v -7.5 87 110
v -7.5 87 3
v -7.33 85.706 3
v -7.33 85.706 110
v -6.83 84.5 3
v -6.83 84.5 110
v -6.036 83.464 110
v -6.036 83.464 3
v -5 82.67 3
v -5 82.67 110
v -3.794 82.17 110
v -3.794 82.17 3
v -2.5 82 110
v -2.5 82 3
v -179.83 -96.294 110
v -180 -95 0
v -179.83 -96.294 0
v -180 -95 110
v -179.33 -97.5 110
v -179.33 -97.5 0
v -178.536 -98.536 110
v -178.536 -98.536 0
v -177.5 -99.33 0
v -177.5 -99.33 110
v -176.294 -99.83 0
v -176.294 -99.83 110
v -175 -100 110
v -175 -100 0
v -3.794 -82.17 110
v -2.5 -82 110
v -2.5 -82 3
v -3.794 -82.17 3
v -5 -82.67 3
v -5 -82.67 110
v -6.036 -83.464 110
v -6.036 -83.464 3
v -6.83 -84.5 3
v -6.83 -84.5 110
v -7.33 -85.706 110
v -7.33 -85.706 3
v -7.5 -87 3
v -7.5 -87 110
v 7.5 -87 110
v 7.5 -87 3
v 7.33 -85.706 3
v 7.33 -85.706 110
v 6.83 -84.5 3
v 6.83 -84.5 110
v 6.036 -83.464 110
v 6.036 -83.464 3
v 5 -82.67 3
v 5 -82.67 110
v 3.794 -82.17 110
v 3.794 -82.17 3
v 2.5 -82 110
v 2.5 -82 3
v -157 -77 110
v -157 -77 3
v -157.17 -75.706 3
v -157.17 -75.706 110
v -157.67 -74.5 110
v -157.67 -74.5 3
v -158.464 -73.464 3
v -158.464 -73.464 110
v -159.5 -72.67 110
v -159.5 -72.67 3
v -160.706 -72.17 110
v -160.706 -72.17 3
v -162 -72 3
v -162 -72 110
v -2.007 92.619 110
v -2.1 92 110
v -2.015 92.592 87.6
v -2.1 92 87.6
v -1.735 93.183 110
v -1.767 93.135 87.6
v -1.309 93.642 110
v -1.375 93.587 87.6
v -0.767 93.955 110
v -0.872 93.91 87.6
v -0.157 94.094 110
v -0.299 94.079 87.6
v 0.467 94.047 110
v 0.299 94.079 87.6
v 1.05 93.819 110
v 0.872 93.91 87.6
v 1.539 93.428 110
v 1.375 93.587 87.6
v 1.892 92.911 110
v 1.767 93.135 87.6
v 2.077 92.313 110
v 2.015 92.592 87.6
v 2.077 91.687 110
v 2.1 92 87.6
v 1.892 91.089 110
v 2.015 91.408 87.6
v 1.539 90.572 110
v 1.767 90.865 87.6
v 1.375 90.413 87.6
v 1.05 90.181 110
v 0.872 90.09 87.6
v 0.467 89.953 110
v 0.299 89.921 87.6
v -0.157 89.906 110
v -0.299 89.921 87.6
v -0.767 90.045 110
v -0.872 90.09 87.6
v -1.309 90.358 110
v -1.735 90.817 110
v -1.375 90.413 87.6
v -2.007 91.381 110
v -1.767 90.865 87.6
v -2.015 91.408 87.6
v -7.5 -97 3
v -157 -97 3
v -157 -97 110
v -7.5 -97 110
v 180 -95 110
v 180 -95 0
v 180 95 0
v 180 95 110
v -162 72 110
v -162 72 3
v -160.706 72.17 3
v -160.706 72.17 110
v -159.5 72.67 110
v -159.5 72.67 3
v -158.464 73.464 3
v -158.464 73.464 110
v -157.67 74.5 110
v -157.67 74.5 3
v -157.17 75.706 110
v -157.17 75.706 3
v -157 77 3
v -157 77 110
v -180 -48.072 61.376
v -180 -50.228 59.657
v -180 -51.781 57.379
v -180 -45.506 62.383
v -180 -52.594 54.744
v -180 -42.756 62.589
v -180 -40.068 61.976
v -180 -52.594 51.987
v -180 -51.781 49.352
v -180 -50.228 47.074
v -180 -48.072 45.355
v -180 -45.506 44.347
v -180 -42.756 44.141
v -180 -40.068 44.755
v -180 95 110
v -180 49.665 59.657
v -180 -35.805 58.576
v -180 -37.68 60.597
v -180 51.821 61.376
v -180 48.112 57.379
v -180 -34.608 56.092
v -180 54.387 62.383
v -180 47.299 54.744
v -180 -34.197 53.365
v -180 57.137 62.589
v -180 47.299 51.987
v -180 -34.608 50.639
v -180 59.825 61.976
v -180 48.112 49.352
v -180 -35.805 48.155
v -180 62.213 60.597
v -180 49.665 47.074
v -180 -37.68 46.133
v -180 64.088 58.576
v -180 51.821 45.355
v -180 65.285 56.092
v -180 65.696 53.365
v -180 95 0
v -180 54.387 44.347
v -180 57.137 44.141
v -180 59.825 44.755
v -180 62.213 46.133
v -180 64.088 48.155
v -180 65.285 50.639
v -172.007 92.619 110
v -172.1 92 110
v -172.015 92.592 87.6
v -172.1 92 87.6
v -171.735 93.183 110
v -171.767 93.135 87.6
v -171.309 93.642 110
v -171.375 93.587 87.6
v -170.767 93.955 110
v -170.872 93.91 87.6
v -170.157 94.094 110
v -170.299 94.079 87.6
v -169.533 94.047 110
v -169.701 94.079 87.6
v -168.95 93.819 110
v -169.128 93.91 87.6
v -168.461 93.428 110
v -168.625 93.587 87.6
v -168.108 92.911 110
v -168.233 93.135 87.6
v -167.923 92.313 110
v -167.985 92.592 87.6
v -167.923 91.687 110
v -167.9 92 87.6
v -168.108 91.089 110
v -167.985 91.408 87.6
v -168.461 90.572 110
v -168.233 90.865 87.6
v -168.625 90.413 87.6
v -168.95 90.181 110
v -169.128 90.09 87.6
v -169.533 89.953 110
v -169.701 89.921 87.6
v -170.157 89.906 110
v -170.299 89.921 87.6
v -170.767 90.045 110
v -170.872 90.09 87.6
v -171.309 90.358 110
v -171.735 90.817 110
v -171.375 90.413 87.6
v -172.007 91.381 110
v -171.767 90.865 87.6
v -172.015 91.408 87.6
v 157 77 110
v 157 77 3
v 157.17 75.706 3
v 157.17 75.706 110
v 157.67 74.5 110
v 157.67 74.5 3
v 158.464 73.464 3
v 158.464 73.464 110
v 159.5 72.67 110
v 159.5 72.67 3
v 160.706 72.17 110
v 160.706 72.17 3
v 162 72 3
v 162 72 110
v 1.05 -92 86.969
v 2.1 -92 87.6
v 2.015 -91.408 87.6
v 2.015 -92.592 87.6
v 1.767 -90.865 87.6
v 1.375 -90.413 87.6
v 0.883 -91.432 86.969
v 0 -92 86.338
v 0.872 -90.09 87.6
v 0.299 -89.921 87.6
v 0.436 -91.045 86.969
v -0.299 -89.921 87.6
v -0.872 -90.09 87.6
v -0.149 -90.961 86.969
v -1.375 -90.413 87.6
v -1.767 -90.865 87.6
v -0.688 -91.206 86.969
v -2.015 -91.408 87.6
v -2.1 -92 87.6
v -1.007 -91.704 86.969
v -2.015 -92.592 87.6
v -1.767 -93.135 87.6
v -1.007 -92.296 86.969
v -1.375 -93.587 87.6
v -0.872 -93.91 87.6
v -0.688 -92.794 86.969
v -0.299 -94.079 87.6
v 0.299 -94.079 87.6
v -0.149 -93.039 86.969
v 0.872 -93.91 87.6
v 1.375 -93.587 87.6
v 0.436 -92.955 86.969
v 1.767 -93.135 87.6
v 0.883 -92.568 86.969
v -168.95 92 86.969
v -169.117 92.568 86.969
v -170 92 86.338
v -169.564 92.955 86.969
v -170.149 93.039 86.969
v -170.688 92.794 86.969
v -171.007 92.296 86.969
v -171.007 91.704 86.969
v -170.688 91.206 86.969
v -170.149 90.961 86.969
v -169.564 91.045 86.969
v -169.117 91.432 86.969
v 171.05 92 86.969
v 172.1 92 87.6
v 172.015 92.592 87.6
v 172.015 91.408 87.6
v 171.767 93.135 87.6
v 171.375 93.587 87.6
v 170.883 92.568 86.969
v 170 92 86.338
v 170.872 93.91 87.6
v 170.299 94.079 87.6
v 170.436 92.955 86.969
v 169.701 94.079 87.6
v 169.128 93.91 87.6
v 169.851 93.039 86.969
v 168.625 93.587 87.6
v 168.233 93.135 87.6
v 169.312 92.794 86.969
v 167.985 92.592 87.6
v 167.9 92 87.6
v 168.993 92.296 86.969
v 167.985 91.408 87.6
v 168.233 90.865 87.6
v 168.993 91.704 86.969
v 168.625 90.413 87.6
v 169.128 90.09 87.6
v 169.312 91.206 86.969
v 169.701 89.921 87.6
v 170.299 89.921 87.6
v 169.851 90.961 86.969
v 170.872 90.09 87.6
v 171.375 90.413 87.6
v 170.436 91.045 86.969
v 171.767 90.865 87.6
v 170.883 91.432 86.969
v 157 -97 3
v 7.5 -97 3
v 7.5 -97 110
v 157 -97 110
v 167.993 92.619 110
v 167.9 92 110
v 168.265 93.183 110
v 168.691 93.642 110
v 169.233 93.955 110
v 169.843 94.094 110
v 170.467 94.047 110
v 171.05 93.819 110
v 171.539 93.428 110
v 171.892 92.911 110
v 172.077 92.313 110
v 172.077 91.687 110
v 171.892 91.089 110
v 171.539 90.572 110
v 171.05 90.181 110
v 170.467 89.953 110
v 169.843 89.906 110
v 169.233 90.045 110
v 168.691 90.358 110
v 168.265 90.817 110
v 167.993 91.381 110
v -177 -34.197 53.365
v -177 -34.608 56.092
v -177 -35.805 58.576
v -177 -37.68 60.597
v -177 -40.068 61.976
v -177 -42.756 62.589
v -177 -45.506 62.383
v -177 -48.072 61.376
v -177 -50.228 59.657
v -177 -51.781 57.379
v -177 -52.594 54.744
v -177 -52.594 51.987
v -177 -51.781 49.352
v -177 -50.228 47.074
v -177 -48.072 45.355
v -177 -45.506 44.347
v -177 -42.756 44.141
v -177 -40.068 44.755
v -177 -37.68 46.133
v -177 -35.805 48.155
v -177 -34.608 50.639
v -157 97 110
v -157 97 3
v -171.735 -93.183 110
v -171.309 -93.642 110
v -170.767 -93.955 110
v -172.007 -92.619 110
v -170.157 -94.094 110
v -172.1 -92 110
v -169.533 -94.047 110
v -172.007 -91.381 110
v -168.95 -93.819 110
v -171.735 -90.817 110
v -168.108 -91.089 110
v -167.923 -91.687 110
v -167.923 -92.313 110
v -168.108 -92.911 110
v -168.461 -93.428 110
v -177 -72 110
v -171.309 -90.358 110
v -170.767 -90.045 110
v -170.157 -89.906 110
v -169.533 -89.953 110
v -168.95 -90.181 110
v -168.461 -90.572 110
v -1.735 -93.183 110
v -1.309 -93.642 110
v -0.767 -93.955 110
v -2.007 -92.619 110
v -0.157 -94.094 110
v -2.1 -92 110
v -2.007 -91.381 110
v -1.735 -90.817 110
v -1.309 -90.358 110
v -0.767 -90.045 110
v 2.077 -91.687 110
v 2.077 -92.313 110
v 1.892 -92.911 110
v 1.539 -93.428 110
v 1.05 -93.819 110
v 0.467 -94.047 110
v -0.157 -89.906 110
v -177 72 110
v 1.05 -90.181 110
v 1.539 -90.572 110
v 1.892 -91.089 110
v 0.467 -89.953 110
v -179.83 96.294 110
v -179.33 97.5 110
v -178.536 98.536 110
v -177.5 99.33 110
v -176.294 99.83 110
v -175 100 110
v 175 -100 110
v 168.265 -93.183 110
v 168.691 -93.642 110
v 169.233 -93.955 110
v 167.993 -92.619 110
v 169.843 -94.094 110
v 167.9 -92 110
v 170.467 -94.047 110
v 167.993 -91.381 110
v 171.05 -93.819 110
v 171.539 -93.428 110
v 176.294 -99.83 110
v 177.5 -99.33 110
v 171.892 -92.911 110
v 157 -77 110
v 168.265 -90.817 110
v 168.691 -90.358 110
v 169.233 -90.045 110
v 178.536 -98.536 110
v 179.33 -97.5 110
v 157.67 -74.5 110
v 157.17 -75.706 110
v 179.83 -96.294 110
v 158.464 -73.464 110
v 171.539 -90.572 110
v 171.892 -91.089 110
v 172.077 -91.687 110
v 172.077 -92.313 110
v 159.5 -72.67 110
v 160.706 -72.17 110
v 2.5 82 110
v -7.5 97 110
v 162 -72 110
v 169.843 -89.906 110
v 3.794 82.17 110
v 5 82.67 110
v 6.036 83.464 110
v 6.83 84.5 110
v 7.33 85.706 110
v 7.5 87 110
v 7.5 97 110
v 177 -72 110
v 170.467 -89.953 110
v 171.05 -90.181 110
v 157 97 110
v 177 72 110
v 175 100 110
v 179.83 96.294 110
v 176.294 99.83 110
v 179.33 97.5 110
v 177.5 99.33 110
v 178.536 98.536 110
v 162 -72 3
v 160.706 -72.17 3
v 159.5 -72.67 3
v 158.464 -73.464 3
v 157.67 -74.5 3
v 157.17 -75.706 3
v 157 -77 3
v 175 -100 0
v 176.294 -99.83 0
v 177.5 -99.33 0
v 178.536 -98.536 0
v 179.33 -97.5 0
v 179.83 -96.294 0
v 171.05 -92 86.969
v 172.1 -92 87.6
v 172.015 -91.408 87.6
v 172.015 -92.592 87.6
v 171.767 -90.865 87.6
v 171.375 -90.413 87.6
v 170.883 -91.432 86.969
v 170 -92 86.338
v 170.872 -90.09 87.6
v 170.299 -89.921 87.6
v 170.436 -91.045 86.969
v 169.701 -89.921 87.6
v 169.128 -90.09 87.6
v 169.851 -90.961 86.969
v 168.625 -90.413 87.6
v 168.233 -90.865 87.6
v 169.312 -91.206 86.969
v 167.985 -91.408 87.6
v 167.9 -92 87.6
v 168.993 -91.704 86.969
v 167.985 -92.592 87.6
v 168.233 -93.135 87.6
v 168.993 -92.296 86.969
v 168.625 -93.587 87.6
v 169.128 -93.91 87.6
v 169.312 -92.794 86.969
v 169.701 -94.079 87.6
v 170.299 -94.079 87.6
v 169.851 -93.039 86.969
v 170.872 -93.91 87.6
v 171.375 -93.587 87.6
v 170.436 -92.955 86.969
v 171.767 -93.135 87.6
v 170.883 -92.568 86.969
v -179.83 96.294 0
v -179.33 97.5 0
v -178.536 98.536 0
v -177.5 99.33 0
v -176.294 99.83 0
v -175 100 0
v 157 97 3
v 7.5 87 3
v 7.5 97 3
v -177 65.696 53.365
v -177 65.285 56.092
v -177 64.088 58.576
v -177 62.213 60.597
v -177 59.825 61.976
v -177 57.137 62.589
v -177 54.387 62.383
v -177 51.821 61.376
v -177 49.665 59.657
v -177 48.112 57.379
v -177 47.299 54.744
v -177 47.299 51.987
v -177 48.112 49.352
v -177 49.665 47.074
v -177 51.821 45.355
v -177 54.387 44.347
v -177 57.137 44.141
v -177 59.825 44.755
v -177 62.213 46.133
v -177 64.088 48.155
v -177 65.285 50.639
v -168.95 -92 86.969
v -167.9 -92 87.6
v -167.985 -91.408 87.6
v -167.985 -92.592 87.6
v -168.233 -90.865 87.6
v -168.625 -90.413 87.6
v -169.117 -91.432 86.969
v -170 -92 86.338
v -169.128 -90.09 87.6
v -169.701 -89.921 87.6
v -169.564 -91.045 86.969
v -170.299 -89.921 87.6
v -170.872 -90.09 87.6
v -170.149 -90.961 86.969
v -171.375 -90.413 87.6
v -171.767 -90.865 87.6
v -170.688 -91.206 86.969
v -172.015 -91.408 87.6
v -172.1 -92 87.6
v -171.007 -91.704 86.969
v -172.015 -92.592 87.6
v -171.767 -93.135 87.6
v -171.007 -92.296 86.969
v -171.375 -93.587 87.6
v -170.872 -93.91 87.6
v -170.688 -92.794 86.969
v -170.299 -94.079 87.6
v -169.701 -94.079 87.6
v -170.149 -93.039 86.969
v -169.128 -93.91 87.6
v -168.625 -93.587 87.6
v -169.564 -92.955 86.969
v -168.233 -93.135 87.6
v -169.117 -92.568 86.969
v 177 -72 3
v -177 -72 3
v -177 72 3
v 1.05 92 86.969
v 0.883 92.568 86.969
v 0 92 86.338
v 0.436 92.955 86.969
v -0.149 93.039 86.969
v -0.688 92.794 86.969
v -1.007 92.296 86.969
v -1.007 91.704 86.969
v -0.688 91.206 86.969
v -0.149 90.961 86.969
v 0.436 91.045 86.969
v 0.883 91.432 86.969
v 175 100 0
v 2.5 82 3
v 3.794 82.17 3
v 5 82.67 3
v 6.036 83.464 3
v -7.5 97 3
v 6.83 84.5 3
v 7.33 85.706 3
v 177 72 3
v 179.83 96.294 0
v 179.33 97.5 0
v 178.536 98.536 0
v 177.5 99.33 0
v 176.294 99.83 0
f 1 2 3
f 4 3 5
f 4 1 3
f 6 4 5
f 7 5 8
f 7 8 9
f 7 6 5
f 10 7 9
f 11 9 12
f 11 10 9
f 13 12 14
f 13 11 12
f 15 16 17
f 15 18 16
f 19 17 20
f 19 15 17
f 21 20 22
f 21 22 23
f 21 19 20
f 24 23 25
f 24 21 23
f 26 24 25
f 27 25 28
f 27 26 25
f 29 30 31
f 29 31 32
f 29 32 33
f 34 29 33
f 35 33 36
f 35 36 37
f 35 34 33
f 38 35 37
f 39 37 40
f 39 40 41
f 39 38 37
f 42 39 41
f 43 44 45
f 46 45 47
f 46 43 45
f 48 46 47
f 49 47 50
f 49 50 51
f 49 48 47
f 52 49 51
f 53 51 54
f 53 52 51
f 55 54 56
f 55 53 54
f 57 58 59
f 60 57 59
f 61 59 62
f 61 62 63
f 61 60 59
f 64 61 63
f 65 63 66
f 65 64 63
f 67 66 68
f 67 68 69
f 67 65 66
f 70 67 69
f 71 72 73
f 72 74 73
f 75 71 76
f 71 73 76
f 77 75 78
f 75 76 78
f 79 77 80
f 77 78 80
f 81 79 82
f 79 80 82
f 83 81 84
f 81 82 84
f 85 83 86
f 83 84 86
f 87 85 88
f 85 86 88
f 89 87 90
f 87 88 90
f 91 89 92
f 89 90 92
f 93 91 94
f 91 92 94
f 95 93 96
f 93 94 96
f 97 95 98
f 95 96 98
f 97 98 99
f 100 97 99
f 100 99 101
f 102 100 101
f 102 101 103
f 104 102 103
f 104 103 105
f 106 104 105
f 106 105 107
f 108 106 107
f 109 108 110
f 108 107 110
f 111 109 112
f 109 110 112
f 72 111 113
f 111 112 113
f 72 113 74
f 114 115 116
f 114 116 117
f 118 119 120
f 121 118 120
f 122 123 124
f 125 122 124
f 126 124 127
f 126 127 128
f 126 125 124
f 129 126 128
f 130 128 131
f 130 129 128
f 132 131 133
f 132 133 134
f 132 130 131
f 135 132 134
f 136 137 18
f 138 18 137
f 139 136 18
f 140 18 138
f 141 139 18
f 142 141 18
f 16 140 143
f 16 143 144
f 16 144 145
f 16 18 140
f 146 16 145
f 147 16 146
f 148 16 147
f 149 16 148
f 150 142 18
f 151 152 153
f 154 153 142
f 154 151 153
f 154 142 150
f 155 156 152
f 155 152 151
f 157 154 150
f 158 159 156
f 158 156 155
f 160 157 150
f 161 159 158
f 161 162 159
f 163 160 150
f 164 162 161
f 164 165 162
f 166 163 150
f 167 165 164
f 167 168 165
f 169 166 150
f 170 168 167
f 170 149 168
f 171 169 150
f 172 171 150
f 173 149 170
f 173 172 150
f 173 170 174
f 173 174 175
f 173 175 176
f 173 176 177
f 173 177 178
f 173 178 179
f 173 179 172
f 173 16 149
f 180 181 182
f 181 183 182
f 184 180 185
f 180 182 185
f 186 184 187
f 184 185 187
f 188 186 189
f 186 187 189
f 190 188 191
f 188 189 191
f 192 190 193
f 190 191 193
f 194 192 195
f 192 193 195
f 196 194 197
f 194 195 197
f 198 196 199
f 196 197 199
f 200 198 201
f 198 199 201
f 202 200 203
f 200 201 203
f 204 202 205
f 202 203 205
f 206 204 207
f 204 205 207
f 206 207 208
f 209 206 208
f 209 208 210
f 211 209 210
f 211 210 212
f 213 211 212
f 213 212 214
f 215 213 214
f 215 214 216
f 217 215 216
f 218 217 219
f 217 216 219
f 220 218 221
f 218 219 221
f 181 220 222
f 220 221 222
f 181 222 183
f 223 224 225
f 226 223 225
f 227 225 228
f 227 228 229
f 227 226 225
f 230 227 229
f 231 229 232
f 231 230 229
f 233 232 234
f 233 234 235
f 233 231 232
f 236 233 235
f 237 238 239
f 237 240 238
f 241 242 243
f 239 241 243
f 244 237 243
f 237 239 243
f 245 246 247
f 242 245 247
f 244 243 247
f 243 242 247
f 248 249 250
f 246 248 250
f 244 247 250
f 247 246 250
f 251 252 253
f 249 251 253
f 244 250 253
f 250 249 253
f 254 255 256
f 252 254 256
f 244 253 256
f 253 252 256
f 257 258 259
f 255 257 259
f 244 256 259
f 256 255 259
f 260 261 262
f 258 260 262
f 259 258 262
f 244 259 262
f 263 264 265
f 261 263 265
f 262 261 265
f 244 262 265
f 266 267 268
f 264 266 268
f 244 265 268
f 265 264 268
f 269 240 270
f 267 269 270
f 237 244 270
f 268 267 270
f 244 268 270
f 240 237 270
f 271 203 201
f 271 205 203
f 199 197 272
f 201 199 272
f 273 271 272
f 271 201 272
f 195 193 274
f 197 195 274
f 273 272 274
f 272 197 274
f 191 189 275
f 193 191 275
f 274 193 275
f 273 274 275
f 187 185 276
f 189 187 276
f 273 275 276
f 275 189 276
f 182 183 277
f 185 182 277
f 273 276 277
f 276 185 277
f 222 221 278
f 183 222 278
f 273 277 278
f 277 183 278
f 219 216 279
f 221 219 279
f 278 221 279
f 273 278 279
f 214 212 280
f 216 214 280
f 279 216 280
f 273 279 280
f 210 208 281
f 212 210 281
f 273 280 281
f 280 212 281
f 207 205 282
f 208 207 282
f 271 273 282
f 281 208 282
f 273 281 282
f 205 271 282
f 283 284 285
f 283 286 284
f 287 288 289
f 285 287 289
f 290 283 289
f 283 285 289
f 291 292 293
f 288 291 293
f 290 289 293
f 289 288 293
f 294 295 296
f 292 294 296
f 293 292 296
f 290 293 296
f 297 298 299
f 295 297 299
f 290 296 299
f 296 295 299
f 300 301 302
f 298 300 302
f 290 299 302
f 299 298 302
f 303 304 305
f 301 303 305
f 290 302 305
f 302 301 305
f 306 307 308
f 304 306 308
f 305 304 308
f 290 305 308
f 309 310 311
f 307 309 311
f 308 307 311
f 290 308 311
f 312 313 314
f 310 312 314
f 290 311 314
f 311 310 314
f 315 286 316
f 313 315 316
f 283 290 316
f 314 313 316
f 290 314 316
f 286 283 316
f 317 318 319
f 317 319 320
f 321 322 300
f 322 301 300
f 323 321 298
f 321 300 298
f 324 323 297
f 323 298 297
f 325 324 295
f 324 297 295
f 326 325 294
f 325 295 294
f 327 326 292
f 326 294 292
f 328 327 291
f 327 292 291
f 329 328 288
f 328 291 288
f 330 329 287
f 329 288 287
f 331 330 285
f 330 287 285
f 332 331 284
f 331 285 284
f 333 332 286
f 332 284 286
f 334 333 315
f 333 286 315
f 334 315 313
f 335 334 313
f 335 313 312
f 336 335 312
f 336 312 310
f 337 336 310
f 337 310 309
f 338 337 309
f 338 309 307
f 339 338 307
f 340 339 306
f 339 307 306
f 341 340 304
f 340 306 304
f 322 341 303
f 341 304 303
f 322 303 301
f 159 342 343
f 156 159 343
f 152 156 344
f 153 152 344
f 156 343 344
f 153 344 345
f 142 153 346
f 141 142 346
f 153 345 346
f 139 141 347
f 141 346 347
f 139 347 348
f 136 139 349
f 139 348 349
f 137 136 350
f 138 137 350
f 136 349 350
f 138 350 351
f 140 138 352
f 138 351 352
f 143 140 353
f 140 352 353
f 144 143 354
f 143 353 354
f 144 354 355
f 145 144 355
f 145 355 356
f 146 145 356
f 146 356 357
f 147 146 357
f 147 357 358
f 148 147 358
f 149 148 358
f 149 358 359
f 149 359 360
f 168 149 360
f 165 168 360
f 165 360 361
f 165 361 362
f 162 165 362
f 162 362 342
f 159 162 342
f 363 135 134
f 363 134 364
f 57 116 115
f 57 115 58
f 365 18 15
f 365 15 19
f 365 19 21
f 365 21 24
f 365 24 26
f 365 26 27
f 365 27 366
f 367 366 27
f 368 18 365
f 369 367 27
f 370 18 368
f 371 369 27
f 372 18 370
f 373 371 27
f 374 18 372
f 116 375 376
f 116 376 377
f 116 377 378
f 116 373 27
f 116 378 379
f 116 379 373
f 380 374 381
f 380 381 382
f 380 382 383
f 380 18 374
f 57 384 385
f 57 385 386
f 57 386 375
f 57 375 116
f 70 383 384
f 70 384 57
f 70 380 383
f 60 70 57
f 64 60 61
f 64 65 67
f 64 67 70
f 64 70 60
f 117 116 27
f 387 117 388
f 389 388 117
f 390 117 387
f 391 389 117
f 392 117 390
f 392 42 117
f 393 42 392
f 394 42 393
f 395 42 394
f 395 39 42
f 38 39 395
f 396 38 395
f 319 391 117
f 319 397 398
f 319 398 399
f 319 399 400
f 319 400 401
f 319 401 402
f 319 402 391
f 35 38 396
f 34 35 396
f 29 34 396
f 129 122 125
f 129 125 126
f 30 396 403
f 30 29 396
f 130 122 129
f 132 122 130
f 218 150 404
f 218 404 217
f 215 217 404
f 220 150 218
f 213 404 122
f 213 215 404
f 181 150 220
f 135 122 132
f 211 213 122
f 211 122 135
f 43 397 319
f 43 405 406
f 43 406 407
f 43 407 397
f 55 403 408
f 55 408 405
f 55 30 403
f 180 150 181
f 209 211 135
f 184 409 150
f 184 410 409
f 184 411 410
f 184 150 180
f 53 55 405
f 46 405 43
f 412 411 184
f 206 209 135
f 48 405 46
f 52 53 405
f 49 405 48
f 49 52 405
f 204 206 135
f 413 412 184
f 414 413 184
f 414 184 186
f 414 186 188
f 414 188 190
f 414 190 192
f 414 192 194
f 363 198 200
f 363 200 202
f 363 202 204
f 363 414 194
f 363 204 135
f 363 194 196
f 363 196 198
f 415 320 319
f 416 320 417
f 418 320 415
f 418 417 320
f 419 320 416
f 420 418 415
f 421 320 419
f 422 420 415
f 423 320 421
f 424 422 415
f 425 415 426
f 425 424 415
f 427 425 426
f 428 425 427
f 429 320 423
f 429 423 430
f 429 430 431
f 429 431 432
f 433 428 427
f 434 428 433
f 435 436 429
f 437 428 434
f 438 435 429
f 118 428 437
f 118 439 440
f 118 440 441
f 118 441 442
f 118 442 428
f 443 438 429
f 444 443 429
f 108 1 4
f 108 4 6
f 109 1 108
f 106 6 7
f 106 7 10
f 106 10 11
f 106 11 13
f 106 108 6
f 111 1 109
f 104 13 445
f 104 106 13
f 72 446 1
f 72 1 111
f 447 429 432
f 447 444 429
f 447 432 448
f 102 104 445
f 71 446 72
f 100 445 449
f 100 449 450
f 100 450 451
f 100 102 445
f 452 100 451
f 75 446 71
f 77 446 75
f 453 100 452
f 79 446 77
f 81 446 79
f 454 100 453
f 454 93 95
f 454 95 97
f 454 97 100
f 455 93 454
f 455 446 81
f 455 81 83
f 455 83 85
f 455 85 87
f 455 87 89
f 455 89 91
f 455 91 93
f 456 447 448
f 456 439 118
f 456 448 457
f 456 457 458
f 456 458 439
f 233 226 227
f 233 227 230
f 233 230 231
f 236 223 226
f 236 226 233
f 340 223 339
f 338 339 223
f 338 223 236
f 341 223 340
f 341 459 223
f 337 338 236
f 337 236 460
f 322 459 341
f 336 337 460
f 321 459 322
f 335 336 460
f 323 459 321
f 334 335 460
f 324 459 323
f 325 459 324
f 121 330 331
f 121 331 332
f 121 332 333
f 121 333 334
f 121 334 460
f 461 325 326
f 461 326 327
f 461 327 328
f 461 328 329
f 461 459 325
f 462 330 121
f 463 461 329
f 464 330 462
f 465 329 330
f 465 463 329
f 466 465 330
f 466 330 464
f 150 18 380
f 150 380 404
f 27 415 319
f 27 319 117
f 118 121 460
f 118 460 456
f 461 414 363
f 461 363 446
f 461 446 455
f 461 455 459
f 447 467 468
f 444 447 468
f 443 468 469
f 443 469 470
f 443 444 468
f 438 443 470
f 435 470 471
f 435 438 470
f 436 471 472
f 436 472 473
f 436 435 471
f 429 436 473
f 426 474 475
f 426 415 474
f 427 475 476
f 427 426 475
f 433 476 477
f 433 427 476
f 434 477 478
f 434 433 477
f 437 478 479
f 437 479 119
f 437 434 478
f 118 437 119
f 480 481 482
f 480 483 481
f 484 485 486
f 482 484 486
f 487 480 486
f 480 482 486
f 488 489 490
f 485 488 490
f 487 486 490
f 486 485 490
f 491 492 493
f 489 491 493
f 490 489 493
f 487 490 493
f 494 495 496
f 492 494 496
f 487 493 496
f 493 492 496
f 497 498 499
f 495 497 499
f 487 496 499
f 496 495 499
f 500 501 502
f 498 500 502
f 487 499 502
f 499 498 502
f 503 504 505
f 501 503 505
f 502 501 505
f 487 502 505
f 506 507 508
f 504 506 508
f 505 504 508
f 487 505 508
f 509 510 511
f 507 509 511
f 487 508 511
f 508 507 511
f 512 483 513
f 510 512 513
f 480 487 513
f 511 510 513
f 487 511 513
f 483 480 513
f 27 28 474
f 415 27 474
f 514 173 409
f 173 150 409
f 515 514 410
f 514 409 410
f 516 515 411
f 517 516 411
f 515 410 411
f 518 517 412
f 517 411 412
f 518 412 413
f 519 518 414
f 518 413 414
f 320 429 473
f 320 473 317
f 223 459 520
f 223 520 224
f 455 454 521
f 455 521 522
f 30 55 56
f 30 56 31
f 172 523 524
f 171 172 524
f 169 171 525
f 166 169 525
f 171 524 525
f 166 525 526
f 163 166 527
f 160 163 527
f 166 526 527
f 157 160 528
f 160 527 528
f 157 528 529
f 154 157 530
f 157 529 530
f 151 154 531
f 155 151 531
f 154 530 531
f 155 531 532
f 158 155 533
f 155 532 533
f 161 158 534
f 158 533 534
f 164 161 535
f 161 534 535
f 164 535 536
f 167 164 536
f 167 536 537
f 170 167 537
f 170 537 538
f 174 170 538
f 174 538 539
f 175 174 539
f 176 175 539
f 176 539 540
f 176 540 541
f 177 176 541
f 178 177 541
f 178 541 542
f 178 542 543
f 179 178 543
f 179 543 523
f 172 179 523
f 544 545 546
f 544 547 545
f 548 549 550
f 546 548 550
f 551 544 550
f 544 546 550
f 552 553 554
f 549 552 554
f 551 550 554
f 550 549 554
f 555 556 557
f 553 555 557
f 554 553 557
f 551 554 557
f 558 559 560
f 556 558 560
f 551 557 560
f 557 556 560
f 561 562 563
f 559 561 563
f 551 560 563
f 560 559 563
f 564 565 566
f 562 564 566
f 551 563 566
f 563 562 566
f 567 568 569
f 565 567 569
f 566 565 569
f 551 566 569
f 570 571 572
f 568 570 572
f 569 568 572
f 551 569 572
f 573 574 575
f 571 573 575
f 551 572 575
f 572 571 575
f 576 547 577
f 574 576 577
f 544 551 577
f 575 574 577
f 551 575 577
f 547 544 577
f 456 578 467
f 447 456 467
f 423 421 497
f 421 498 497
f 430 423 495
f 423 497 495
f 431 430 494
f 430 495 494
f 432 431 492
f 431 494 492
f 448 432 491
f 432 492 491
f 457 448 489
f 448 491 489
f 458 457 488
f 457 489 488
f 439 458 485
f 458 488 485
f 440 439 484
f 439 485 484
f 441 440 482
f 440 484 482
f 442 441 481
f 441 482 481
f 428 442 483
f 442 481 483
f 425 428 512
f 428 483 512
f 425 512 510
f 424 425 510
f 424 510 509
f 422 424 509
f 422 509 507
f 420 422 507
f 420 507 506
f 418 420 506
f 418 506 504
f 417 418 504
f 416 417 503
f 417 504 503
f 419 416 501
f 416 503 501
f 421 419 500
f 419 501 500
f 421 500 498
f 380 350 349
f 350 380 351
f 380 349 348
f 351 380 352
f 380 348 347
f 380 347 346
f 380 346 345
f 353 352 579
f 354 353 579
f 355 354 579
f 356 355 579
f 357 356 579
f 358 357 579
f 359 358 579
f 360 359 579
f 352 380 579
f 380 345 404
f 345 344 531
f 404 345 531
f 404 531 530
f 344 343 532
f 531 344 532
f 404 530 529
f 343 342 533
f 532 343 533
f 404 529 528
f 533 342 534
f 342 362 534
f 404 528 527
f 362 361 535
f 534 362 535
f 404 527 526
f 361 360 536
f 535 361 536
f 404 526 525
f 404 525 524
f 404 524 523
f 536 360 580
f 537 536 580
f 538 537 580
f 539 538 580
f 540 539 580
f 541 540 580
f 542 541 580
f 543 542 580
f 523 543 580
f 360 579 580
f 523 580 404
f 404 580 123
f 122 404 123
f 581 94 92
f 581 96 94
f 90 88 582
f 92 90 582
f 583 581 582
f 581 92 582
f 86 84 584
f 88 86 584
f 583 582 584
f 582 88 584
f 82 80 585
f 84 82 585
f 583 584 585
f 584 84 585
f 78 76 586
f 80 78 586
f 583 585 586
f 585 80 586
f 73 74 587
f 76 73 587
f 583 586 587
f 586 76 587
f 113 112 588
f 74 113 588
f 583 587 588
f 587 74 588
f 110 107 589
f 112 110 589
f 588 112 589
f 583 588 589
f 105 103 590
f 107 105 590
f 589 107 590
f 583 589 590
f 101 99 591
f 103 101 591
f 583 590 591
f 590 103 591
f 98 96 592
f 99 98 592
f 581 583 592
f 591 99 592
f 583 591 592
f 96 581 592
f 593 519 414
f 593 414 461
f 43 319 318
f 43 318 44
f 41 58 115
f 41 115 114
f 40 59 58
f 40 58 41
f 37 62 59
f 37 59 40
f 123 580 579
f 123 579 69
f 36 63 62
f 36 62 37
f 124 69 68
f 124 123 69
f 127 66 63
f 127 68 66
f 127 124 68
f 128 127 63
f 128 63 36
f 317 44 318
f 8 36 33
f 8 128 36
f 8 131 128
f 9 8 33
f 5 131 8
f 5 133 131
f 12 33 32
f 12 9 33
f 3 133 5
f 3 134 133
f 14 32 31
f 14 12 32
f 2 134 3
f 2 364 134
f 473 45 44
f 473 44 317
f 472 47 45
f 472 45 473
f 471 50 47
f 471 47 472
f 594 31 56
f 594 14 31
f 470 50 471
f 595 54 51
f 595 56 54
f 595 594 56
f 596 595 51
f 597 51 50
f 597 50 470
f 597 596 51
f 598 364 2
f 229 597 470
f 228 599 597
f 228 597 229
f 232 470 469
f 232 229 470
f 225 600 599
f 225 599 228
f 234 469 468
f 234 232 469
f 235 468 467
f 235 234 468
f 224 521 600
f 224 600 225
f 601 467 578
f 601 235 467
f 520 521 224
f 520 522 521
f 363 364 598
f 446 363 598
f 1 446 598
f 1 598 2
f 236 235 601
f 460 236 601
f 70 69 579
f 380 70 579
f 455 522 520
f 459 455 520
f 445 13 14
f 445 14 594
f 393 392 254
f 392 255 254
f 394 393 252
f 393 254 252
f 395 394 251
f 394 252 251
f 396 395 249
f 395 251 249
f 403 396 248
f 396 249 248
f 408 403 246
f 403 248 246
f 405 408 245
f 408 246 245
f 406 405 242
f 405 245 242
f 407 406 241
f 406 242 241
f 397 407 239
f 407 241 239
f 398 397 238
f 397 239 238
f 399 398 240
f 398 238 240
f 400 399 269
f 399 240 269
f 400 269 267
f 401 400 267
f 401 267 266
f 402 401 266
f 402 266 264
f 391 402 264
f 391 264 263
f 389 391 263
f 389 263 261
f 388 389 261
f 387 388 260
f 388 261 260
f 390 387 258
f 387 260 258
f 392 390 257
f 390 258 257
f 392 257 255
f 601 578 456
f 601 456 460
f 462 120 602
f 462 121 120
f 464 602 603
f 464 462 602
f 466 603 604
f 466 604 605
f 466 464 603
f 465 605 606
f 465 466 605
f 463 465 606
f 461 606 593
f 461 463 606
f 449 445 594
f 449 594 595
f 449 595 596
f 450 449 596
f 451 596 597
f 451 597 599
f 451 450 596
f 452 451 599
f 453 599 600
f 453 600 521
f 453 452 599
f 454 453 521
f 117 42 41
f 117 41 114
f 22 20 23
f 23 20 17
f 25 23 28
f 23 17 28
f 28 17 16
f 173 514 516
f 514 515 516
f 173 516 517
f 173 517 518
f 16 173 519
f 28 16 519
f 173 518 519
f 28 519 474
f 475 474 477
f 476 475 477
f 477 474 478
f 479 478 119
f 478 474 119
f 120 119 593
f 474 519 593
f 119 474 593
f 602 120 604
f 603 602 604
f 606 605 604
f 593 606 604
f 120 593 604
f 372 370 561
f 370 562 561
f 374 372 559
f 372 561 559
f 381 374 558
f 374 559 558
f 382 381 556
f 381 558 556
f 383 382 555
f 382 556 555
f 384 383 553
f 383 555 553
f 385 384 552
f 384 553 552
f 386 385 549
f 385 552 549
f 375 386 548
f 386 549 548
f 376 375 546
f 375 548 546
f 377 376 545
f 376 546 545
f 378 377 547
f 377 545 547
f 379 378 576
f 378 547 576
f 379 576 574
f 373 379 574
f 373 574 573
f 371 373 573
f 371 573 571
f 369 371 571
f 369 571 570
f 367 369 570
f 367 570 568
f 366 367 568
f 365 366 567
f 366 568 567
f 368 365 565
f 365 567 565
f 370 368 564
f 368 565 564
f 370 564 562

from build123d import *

# Parameters (mm, degrees)
F0_W     = 360
F0_H     = 200
F1_DEPTH = 110
F2_R     = 5
F3_T     = -3
F5_D     = 18.5
F5_DEPTH = 16.5
F5_TIP   = 5.557960726
F8_DEPTH = 107
F9_D     = 4.2
F9_DEPTH = 22.4
F9_TIP   = 1.2618073


with BuildPart() as f1:
    # F0 (on Top) → F1 (new body)
    with BuildSketch(Plane.XY):
        Rectangle(F0_W, F0_H)
    extrude(amount=F1_DEPTH)

    # F2
    f2_edges = [f1.edges().sort_by_distance(p)[0] for p in [
        (-180, 100, 55),
        (-180, -100, 55),
        (180, -100, 55),
        (180, 100, 55),
    ]]
    fillet(f2_edges, radius=F2_R)

    # F3
    f3_openings = [f1.faces().sort_by_distance(p)[0] for p in [
        (0, 0, 110),
    ]]
    offset(amount=F3_T, openings=f3_openings)

    # F5
    with Locations(Plane(origin=(-180, 0, 0), x_dir=(0, -1, 0), z_dir=(-1, 0, 0))):
        with Locations((-56.4456321299, 53.3652417362), (43.4474907815, 53.3652417362)):
            Hole(F5_D / 2, depth=F5_DEPTH)
            with Locations((0, 0, -(F5_DEPTH + F5_TIP / 2))):  # 118° drill point
                Cone(0, F5_D / 2, F5_TIP, mode=Mode.SUBTRACT)

    # F7 (on face) → F8 (join, through all)
    with BuildSketch(Plane.XY.offset(110)):
        with BuildLine():
            Line((-177, 95), (-177, 72))
            Line((-177, 72), (-162, 72))
            ThreePointArc((-162, 72), (-158.4644660941, 73.4644660941), (-157, 77))
            Line((-157, 77), (-157, 97))
            Line((-157, 97), (-175, 97))
            ThreePointArc((-175, 97), (-176.4142135624, 96.4142135624), (-177, 95))
        make_face()
        with BuildLine():
            Line((-175, -97), (-157, -97))
            Line((-157, -97), (-157, -77))
            ThreePointArc((-157, -77), (-158.4644660941, -73.4644660941), (-162, -72))
            Line((-162, -72), (-177, -72))
            Line((-177, -72), (-177, -95))
            ThreePointArc((-177, -95), (-176.4142135624, -96.4142135624), (-175, -97))
        make_face()
        with BuildLine():
            Line((7.5, 87), (7.5, 97))
            Line((7.5, 97), (-7.5, 97))
            Line((-7.5, 97), (-7.5, 87))
            ThreePointArc((-7.5, 87), (-6.0355339059, 83.4644660941), (-2.5, 82))
            Line((-2.5, 82), (2.5, 82))
            ThreePointArc((2.5, 82), (6.0355339059, 83.4644660941), (7.5, 87))
        make_face()
        with BuildLine():
            Line((-7.5, -97), (7.5, -97))
            Line((7.5, -97), (7.5, -87))
            ThreePointArc((7.5, -87), (6.0355339059, -83.4644660941), (2.5, -82))
            Line((2.5, -82), (-2.5, -82))
            ThreePointArc((-2.5, -82), (-6.0355339059, -83.4644660941), (-7.5, -87))
            Line((-7.5, -87), (-7.5, -97))
        make_face()
        with BuildLine():
            Line((157, -97), (175, -97))
            ThreePointArc((175, -97), (176.4142135624, -96.4142135624), (177, -95))
            Line((177, -95), (177, -72))
            Line((177, -72), (162, -72))
            ThreePointArc((162, -72), (158.4644660941, -73.4644660941), (157, -77))
            Line((157, -77), (157, -97))
        make_face()
        with BuildLine():
            Line((162, 72), (177, 72))
            Line((177, 72), (177, 95))
            ThreePointArc((177, 95), (176.4142135624, 96.4142135624), (175, 97))
            Line((175, 97), (157, 97))
            Line((157, 97), (157, 77))
            ThreePointArc((157, 77), (158.4644660941, 73.4644660941), (162, 72))
        make_face()
    extrude(amount=-F8_DEPTH)

    # F9
    with Locations(Plane.XY.offset(110)):
        with Locations((-170, -92), (-170, 92), (0, 92), (170, 92), (170, -92), (0, -92)):
            Hole(F9_D / 2, depth=F9_DEPTH)
            with Locations((0, 0, -(F9_DEPTH + F9_TIP / 2))):  # 118° drill point
                Cone(0, F9_D / 2, F9_TIP, mode=Mode.SUBTRACT)


solid = f1.part
